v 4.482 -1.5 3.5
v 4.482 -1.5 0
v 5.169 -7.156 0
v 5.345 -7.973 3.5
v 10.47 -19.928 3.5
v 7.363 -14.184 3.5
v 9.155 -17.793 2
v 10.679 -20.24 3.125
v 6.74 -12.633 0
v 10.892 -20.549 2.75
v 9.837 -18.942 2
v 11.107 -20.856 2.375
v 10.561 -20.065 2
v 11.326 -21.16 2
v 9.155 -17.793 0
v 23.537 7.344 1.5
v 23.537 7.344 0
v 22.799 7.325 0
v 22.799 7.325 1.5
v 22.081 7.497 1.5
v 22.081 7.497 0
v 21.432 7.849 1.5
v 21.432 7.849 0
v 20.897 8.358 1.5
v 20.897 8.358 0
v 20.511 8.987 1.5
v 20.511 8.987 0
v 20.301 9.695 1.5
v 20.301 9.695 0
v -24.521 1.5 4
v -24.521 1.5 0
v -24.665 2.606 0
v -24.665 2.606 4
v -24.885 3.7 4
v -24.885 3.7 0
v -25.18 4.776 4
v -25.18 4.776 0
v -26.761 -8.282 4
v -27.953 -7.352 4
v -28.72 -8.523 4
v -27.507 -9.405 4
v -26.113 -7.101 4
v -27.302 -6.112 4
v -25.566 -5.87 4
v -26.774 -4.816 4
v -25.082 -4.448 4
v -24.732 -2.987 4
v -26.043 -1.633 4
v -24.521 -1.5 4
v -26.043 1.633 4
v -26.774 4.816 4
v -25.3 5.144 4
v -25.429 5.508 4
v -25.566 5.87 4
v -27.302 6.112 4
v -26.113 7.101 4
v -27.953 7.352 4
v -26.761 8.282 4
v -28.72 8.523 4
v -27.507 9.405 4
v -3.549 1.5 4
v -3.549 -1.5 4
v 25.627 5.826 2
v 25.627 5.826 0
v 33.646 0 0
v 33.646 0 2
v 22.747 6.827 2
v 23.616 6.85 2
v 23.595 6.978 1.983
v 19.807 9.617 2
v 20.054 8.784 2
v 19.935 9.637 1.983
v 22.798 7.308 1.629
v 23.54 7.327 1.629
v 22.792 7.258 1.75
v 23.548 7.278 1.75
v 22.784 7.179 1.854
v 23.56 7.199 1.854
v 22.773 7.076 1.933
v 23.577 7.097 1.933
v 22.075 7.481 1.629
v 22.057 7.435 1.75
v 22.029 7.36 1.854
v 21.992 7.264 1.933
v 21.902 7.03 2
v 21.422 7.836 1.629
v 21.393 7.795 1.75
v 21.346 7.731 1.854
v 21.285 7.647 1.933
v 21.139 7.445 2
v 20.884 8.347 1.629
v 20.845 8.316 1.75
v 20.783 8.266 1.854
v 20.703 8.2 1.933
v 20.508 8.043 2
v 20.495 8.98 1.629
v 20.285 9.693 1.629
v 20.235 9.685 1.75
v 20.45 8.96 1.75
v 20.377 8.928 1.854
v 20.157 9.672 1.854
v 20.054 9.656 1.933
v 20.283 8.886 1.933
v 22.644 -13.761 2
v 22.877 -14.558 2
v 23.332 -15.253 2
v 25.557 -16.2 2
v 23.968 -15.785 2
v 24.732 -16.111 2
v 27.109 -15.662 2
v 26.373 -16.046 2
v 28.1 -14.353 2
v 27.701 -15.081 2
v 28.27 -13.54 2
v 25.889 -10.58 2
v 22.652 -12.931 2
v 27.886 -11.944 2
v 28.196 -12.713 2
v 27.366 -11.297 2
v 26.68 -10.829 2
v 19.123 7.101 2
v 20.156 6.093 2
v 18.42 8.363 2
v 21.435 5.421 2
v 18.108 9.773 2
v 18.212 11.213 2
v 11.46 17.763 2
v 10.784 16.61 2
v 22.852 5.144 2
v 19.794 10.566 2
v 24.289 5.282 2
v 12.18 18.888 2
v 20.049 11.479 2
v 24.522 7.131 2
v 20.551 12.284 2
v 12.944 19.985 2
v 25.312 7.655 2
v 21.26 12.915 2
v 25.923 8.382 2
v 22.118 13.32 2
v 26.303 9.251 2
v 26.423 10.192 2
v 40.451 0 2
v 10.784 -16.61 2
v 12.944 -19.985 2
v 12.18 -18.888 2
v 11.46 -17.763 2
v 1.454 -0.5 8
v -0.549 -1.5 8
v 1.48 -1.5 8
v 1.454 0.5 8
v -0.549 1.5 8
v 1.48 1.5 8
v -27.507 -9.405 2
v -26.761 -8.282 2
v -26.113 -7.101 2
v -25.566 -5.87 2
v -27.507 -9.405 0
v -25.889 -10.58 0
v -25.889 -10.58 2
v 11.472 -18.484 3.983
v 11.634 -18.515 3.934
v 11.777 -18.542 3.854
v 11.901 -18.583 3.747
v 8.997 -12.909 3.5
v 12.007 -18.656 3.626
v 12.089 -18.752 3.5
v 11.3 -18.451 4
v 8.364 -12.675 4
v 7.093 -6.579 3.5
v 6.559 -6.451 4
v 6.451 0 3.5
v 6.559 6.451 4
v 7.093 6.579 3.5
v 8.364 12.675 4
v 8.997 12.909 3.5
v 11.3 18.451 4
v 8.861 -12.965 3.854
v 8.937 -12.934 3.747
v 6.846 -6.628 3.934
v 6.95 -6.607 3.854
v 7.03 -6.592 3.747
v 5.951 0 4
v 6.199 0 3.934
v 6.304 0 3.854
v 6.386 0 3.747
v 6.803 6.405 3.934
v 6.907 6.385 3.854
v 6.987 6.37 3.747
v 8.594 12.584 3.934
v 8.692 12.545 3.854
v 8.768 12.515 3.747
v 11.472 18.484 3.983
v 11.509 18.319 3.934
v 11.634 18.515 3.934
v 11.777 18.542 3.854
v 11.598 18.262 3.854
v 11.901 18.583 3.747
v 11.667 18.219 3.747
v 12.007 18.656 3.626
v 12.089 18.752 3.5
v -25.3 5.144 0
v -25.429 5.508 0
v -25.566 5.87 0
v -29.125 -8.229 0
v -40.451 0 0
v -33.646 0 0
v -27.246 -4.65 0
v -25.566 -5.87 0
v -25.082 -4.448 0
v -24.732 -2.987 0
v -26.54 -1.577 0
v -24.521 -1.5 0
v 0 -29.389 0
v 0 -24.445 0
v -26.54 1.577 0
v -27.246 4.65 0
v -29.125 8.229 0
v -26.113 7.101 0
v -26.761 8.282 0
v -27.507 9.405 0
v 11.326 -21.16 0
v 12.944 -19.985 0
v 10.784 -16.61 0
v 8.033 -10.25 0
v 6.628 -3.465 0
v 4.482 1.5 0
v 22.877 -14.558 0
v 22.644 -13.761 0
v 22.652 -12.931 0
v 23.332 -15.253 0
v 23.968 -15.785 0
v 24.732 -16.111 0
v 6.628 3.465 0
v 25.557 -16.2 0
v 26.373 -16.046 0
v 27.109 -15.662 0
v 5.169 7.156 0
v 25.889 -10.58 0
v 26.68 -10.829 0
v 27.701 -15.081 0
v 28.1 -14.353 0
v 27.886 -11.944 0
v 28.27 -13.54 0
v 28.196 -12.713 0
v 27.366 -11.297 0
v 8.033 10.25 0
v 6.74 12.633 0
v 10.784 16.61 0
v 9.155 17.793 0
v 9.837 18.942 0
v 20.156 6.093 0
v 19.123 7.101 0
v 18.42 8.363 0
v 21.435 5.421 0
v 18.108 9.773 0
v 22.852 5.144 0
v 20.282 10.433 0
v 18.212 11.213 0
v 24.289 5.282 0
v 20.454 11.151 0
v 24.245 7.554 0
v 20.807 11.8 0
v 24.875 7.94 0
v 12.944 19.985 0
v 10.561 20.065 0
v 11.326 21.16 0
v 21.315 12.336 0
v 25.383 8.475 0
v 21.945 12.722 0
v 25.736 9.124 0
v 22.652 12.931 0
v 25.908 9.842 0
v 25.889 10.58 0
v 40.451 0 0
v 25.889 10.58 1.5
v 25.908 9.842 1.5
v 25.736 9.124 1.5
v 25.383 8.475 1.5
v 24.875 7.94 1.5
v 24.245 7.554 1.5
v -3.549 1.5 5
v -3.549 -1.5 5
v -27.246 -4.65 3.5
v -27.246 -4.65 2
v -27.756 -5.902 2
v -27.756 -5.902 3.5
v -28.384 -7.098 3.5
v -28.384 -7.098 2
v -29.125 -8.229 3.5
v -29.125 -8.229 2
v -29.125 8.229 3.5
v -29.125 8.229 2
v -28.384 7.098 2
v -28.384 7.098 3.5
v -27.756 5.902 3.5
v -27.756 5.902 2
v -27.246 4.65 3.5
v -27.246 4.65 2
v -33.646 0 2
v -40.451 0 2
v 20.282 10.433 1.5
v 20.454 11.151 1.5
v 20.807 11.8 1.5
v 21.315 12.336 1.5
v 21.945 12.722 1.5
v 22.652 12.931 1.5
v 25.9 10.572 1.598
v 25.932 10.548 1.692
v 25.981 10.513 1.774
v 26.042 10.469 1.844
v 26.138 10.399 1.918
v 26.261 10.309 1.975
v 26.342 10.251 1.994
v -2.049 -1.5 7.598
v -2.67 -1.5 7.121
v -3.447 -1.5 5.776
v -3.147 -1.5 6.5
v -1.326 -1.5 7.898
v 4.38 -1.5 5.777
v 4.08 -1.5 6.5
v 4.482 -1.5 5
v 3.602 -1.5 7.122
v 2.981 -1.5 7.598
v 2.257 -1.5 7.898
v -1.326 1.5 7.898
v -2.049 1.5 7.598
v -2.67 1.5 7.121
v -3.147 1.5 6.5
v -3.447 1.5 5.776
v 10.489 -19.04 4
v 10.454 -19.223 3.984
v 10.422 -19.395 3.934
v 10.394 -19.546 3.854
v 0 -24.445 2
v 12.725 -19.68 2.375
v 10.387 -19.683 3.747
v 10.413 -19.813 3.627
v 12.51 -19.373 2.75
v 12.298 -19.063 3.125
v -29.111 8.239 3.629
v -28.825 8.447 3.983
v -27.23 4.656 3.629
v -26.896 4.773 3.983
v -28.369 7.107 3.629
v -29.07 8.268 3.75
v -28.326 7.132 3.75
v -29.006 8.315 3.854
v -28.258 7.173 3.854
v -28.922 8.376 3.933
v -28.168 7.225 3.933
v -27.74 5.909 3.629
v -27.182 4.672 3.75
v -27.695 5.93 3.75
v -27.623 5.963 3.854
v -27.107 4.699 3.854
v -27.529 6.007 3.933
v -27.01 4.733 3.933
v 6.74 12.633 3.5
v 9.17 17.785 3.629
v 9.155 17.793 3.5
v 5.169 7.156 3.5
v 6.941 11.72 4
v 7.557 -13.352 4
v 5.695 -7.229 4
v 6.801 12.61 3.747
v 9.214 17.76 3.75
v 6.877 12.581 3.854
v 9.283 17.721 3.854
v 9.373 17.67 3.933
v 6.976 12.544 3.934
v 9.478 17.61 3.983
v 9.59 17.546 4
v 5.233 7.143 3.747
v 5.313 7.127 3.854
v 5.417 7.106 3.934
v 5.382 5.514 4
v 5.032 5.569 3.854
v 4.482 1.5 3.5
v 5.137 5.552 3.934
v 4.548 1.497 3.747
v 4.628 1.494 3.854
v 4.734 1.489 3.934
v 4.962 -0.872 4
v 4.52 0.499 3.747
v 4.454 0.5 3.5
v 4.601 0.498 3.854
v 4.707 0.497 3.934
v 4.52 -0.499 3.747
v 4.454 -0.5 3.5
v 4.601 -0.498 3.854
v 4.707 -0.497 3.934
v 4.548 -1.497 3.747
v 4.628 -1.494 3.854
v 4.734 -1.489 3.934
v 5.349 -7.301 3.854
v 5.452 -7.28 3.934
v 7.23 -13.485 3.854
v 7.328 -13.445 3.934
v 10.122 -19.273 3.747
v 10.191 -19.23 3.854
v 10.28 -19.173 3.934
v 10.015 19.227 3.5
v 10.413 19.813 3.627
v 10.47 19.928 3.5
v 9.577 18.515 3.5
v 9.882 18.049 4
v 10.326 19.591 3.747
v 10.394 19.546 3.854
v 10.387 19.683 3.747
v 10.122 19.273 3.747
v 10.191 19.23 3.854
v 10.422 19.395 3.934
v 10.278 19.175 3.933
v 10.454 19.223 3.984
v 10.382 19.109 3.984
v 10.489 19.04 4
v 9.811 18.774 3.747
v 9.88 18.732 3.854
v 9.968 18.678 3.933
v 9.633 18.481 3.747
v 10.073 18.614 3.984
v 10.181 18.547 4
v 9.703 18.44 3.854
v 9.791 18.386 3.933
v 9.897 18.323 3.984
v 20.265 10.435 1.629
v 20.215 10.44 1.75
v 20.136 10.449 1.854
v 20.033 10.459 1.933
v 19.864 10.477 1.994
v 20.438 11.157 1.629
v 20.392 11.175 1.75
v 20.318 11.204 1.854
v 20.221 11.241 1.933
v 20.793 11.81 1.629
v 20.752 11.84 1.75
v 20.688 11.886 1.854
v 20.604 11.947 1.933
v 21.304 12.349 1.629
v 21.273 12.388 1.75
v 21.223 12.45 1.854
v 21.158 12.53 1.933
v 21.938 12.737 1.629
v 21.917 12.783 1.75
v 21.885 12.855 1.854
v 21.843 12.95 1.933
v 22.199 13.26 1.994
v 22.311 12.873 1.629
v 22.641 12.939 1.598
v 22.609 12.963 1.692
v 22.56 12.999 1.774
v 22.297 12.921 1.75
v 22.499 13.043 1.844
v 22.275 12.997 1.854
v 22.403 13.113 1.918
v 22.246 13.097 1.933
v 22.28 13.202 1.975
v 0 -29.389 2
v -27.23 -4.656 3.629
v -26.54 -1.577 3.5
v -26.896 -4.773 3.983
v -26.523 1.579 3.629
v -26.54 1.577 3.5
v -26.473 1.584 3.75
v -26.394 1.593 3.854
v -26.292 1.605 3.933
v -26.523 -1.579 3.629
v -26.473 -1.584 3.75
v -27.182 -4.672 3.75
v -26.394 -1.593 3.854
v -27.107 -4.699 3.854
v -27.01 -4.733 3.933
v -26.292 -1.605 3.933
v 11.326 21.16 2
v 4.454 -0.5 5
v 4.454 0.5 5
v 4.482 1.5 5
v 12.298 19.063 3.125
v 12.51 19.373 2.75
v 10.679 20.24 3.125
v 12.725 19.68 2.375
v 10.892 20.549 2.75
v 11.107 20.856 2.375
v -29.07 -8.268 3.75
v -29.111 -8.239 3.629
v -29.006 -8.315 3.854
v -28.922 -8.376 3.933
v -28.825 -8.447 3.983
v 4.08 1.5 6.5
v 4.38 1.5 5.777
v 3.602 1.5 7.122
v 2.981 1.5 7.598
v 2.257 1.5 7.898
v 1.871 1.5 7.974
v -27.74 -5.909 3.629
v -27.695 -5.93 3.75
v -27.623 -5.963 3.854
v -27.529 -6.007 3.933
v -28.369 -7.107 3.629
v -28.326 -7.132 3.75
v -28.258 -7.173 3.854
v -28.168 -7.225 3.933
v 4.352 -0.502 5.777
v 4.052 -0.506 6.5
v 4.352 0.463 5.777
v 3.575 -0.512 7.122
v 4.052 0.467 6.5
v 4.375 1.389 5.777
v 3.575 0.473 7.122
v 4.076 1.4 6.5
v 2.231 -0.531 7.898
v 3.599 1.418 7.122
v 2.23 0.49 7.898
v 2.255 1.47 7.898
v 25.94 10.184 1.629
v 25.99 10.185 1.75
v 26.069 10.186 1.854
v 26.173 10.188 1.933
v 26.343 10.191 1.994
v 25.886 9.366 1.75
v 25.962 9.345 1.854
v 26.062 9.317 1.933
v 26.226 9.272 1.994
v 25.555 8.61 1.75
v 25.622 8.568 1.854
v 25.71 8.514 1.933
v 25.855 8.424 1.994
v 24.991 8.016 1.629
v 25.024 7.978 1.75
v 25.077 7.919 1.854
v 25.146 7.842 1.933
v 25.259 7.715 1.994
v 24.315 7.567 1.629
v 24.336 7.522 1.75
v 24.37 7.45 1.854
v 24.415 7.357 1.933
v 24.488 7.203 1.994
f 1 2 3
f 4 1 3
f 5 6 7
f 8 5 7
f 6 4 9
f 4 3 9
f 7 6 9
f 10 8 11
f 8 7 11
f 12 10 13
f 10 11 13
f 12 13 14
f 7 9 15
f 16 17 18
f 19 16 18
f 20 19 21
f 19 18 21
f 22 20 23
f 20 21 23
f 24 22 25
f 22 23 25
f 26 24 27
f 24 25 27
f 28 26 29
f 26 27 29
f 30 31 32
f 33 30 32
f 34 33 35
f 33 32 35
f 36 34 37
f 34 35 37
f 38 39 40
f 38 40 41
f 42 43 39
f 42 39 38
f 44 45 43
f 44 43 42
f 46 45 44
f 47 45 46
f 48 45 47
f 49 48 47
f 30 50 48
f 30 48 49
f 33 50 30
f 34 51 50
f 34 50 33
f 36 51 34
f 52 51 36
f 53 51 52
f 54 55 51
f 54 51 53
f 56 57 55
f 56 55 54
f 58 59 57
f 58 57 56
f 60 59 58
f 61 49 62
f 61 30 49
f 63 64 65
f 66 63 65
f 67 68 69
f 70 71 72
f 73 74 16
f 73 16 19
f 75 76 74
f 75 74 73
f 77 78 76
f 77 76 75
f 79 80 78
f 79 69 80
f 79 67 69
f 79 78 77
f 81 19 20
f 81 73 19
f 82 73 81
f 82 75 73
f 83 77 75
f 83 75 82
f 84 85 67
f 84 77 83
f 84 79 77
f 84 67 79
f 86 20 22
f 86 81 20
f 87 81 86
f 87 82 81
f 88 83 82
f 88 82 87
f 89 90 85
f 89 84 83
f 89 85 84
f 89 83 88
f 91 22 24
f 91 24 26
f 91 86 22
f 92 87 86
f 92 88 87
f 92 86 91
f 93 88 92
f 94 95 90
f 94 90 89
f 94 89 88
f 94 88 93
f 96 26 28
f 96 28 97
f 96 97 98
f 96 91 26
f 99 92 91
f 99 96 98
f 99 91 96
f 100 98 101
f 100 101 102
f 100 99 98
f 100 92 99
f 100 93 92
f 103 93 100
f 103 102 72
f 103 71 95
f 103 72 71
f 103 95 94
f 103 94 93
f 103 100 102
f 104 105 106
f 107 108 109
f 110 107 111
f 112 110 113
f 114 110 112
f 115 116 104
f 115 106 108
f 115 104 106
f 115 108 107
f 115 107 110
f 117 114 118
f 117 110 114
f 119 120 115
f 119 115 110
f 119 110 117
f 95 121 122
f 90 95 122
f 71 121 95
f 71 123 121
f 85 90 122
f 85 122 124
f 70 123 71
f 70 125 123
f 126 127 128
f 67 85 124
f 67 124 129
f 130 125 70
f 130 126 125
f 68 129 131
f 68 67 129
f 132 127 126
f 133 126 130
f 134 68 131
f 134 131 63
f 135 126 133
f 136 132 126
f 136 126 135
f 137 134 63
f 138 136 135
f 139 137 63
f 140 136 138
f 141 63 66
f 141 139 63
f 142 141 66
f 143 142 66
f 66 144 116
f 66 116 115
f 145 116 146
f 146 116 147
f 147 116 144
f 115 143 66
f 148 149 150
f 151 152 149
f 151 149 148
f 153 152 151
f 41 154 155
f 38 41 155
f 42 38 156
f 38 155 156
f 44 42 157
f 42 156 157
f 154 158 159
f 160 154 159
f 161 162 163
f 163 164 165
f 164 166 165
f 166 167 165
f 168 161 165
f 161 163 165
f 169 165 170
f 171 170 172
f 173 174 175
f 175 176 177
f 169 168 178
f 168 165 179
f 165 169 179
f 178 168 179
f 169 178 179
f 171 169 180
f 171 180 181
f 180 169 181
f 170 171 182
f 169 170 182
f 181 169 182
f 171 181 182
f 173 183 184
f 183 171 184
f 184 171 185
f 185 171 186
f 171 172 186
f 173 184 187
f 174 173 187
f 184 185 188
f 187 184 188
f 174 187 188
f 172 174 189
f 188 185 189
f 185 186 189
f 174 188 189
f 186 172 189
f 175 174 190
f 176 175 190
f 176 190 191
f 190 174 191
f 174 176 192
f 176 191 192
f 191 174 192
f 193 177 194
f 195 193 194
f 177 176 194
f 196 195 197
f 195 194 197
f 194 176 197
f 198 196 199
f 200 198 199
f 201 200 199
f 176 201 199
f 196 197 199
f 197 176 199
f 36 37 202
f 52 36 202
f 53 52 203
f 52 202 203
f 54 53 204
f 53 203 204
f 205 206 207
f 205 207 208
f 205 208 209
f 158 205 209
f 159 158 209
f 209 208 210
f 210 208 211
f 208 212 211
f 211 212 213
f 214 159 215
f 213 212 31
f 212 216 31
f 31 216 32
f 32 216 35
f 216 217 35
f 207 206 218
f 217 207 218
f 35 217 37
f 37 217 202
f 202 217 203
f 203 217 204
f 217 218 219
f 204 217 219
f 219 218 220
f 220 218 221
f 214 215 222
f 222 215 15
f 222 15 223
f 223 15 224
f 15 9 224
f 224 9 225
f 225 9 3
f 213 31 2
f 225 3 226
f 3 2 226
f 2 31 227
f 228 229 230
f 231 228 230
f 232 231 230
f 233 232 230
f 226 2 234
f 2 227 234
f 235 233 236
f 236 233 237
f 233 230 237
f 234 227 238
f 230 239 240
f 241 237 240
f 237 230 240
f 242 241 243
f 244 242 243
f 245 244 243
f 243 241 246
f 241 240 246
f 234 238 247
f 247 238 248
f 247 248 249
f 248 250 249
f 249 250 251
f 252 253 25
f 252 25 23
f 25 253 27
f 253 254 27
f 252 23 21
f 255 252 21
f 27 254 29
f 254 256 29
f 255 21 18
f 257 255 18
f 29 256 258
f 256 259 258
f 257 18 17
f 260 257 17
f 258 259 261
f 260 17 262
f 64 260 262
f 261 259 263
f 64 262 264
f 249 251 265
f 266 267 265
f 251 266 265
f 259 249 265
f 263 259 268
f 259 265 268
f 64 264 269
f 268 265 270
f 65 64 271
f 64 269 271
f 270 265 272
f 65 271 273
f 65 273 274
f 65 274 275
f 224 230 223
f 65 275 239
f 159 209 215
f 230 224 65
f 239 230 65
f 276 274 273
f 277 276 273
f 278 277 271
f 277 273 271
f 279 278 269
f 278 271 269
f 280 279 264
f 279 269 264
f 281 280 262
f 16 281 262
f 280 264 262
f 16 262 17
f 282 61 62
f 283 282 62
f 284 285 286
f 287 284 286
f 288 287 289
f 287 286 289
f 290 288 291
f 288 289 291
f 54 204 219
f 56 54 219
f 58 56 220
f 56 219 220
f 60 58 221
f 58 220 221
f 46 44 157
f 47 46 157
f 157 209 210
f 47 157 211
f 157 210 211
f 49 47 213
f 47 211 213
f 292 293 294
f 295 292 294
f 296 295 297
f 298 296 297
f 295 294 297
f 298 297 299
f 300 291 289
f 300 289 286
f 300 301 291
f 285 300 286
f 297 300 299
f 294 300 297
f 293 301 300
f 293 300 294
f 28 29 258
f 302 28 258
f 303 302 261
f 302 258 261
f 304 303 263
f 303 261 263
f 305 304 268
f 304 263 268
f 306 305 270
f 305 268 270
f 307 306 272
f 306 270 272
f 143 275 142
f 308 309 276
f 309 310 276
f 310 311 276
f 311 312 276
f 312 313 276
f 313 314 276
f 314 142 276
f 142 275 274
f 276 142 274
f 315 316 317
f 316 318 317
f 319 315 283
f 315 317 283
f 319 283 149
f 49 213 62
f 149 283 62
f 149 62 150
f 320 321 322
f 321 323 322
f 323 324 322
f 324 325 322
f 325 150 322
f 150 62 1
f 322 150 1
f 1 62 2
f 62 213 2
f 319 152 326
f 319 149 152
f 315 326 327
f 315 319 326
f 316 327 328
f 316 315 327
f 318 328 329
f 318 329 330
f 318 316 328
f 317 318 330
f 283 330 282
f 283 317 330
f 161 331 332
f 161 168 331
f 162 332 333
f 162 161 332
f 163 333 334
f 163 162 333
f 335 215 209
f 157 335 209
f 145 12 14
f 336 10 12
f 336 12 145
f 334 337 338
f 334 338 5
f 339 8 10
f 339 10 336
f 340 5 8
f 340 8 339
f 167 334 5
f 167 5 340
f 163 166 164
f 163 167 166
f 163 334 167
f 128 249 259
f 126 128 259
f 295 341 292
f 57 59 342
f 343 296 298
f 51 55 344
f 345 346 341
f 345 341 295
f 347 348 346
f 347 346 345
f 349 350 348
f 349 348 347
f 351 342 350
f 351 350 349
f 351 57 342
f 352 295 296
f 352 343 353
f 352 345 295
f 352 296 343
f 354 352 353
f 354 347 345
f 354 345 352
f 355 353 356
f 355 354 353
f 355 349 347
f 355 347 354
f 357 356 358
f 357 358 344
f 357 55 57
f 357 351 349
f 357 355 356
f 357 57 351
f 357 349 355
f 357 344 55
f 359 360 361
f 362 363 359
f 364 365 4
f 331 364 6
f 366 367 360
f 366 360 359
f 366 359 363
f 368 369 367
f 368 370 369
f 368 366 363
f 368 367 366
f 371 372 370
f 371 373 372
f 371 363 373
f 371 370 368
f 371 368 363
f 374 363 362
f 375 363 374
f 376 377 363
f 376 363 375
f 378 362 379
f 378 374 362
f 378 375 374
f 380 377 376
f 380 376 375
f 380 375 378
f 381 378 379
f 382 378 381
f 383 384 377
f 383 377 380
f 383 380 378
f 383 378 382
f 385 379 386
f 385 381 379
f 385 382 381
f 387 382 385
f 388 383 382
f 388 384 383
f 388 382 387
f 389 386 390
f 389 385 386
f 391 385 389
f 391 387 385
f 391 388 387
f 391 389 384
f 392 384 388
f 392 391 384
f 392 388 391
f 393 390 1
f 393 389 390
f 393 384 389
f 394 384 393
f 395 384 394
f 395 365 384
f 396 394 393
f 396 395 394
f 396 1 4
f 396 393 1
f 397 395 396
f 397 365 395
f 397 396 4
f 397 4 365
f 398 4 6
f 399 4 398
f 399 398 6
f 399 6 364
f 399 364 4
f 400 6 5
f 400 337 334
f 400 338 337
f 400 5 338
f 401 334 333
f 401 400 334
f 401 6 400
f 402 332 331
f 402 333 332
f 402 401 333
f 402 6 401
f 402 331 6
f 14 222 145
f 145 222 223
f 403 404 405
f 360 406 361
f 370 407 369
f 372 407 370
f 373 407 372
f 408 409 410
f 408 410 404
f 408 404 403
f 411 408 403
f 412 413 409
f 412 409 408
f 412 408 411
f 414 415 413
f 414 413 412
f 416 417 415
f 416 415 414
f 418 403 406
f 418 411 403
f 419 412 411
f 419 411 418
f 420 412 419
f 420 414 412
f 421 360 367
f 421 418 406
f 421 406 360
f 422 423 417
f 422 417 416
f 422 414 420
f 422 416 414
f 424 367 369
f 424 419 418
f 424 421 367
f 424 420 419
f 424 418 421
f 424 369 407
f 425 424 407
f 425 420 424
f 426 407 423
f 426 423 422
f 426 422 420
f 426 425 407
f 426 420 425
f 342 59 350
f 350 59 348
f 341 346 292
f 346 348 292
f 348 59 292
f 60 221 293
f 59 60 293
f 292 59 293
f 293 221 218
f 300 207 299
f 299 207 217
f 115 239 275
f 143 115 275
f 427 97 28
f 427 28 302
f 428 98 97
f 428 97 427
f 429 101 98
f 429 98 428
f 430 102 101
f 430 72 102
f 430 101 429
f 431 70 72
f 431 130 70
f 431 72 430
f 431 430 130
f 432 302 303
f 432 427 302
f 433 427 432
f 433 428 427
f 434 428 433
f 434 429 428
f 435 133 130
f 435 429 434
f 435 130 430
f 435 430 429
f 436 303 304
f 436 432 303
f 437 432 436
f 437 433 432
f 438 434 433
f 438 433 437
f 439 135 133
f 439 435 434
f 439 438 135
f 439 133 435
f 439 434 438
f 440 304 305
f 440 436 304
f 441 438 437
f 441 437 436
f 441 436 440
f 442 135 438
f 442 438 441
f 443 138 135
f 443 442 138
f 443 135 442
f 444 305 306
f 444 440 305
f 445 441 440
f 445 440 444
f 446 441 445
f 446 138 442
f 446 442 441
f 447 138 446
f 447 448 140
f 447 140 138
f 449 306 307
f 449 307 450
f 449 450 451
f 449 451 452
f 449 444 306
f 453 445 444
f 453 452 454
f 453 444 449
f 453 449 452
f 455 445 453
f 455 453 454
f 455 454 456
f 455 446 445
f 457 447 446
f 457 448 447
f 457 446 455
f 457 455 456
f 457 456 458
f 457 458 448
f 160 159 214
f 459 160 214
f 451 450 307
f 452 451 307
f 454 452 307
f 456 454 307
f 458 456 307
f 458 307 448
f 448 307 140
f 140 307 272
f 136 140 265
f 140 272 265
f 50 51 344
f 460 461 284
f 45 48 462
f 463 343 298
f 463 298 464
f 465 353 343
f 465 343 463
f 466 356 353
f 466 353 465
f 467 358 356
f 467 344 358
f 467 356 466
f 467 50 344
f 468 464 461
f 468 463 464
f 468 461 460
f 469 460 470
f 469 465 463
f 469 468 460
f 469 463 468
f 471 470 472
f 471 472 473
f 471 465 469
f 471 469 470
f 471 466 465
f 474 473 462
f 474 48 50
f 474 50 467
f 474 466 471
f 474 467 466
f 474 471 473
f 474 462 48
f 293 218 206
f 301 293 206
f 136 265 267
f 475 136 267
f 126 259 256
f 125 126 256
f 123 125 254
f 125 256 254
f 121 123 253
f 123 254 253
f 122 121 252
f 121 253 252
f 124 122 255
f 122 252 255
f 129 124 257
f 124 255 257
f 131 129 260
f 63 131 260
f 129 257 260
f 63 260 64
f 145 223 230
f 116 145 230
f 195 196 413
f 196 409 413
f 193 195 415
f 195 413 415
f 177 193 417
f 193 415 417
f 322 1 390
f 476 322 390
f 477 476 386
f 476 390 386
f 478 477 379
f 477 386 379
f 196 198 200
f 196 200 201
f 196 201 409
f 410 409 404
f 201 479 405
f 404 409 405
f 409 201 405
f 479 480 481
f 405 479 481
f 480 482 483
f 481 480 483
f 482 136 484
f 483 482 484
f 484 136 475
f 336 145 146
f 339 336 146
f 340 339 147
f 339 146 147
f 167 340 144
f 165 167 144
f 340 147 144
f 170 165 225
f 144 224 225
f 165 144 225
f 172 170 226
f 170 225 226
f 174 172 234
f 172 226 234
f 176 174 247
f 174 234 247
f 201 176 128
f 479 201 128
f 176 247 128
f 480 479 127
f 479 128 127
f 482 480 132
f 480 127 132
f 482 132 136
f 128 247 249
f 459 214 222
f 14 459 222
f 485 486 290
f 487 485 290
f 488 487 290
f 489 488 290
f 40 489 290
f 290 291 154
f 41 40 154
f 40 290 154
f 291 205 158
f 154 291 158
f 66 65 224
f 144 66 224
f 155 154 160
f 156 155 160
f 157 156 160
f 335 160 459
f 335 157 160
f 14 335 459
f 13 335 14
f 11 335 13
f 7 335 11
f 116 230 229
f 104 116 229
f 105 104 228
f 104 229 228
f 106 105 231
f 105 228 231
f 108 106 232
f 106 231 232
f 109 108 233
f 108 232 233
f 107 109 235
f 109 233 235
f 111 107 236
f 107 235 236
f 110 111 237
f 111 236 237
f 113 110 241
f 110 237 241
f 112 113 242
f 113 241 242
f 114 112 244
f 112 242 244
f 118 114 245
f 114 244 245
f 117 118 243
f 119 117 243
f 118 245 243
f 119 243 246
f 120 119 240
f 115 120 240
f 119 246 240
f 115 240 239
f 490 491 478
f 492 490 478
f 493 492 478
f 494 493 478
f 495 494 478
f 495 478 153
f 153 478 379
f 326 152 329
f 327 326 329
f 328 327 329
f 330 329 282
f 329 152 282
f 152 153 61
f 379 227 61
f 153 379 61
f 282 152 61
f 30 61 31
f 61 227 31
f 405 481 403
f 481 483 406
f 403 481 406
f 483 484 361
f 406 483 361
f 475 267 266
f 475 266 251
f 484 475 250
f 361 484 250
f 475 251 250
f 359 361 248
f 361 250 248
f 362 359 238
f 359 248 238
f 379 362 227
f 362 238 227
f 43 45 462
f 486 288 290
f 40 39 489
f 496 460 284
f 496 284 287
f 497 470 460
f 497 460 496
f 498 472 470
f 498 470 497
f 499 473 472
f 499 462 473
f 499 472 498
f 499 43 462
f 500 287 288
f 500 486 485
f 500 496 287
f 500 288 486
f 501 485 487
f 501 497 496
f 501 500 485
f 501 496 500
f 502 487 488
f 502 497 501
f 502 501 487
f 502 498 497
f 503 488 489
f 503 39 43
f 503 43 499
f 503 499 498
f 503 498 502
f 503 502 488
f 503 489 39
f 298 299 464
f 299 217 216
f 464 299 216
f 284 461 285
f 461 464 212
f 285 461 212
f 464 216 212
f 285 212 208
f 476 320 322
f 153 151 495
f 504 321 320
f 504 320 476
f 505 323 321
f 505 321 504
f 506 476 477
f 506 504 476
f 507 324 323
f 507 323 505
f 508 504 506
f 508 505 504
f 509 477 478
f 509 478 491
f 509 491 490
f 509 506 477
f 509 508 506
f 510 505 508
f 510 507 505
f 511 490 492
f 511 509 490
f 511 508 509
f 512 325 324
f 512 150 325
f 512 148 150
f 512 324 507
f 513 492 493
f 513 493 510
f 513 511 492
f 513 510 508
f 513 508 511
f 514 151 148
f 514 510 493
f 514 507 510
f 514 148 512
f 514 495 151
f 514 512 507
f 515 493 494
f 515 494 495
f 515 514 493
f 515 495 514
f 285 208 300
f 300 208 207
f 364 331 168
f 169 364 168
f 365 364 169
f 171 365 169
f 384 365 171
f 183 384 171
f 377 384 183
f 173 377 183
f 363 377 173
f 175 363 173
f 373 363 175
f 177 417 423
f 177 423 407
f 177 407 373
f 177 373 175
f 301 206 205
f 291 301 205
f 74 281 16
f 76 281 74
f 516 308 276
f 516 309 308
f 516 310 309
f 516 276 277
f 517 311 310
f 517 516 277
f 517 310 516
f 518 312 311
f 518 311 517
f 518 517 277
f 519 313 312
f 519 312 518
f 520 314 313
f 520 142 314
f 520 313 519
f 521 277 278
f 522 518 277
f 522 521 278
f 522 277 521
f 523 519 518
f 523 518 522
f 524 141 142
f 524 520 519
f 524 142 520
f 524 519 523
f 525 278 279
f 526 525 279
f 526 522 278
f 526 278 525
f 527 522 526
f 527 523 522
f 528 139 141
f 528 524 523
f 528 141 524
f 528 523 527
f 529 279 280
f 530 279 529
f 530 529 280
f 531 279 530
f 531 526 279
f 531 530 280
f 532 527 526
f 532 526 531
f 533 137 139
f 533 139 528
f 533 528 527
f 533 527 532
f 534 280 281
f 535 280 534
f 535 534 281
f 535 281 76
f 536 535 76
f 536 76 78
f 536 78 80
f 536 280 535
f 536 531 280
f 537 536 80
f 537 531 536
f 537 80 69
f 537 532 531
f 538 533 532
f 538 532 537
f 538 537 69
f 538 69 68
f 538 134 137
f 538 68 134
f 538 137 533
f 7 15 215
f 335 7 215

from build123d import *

# Parameters (mm, degrees)
F1_DEPTH = 2
F2_R     = 0.5
F3_DEPTH = 4
F4_SIZE  = 2
F5_R     = 0.5
F6_DEPTH = 8
F7_R     = 3


# Not quite as in the source:
# - a feature names something its author has since deleted; it is built from what else it names


with BuildPart() as f1:
    # F0 (on Top) → F1 (new body)
    with BuildSketch(Plane.XY):
        with BuildLine():
            Line((25.88854382, -10.5801345413), (40.4508497187, 0))
            Line((40.4508497187, 0), (25.88854382, 10.5801345413))
            ThreePointArc((25.88854382, 10.5801345413), (25.3831849379, 8.475163306), (23.5374028108, 7.3440665638))
            Line((23.5374028108, 7.3440665638), (25.6267504373, 5.8260666573))
            Line((25.6267504373, 5.8260666573), (33.6456432519, 0))
            Line((33.6456432519, 0), (10.7841511133, -16.6098462924))
            ThreePointArc((10.7841511133, -16.6098462924), (11.814451709, -18.3291218838), (12.94427191, -19.9846985779))
            Line((12.94427191, -19.9846985779), (22.6524758425, -12.9312755504))
            Line((22.6524758425, -12.9312755504), (25.88854382, -10.5801345413))
        make_face()
        with BuildLine():
            ThreePointArc((22.6524758425, -12.9312755504), (27.1085880869, -15.6619846459), (25.88854382, -10.5801345413))
            Line((25.88854382, -10.5801345413), (22.6524758425, -12.9312755504))
        make_face()
        with BuildLine():
            Line((25.6267504373, 5.8260666573), (23.5374028108, 7.3440665638))
            ThreePointArc((23.5374028108, 7.3440665638), (21.4324315756, 7.8494254458), (20.3013348333, 9.6952075729))
            Line((20.3013348333, 9.6952075729), (18.2119872068, 11.2132074794))
            ThreePointArc((18.2119872068, 11.2132074794), (20.1560130652, 6.0925860852), (25.6267504373, 5.8260666573))
        make_face()
        with BuildLine():
            Line((18.2119872068, 11.2132074794), (20.3013348333, 9.6952075729))
            ThreePointArc((20.3013348333, 9.6952075729), (20.8066937154, 11.8001788082), (22.6524758425, 12.9312755504))
            Line((22.6524758425, 12.9312755504), (12.94427191, 19.9846985779))
            ThreePointArc((12.94427191, 19.9846985779), (11.814451709, 18.3291218838), (10.7841511133, 16.6098462924))
            Line((10.7841511133, 16.6098462924), (18.2119872068, 11.2132074794))
        make_face()
    extrude(amount=F1_DEPTH)

    # F2
    f2_edges = [f1.edges().sort_by_distance(p)[0] for p in [
        (21.432432, 7.849425, 2),
    ]]
    fillet(f2_edges, radius=F2_R)



with BuildPart() as f1b:
    # F0 (on Top) → F1, piece 2 (new body)
    with BuildSketch(Plane.XY):
        with BuildLine():
            Line((0, -29.3892626146), (11.3262379212, -21.1602690825))
            ThreePointArc((11.3262379212, -21.1602690825), (10.1939633159, -19.506943), (9.1554367996, -17.7931765073))
            Line((9.1554367996, -17.7931765073), (0, -24.4449907046))
            Line((0, -24.4449907046), (-25.5664713255, -5.8698619956))
            ThreePointArc((-25.5664713255, -5.8698619956), (-26.4247321499, -7.6985729811), (-27.5065778087, -9.4045640367))
            Line((-27.5065778087, -9.4045640367), (-25.88854382, -10.5801345413))
            Line((-25.88854382, -10.5801345413), (-14.5623058987, -18.8091280734))
            Line((-14.5623058987, -18.8091280734), (0, -29.3892626146))
        make_face()
    extrude(amount=F1_DEPTH)


with BuildPart() as f1c:
    # F0 (on Top) → F1, piece 3 (new body)
    with BuildSketch(Plane.XY):
        with BuildLine():
            Line((9.1554367996, -17.7931765073), (10.7841511133, -16.6098462924))
            ThreePointArc((10.7841511133, -16.6098462924), (6.4508497187, 0), (10.7841511133, 16.6098462924))
            Line((10.7841511133, 16.6098462924), (9.1554367996, 17.7931765073))
            ThreePointArc((9.1554367996, 17.7931765073), (5.8461773909, 9.9255555553), (4.4821132939, 1.5))
            ThreePointArc((4.4821132939, 1.5), (4.4508497187, 0), (4.4821132939, -1.5))
            ThreePointArc((4.4821132939, -1.5), (5.8461773909, -9.9255555553), (9.1554367996, -17.7931765073))
        make_face()
    extrude(amount=F1_DEPTH)


with BuildPart() as f1d:
    # F0 (on Top) → F1, piece 4 (new body)
    with BuildSketch(Plane.XY):
        with BuildLine():
            ThreePointArc((-29.1246117975, -8.2289935321), (-28.0552509558, -6.5076210175), (-27.2456067433, -4.6498987043))
            Line((-27.2456067433, -4.6498987043), (-33.6456432519, 0))
            Line((-33.6456432519, 0), (-27.2456067433, 4.6498987043))
            ThreePointArc((-27.2456067433, 4.6498987043), (-28.0552509558, 6.5076210175), (-29.1246117975, 8.2289935321))
            Line((-29.1246117975, 8.2289935321), (-40.4508497187, 0))
            Line((-40.4508497187, 0), (-29.1246117975, -8.2289935321))
        make_face()
    extrude(amount=F1_DEPTH)


with BuildPart() as f1_1:
    add(f1.part)

    add(f1b.part)  # F3 merges F1b

    add(f1c.part)  # F3 merges F1c

    add(f1d.part)  # F3 merges F1d
    # F0 (on Top) → F3 (join)
    with BuildSketch(Plane.XY):
        with BuildLine():
            Line((-27.2456067433, -4.6498987043), (-25.5664713255, -5.8698619956))
            ThreePointArc((-25.5664713255, -5.8698619956), (-24.8897380342, -3.7218010616), (-24.5213173967, -1.5))
            ThreePointArc((-24.5213173967, -1.5), (-24.4508497187, 0), (-24.5213173967, 1.5))
            ThreePointArc((-24.5213173967, 1.5), (-24.7650379905, 3.1552037061), (-25.1802669457, 4.7759084761))
            ThreePointArc((-25.1802669457, 4.7759084761), (-25.3634508604, 5.3263867387), (-25.5664713255, 5.8698619956))
            Line((-25.5664713255, 5.8698619956), (-27.2456067433, 4.6498987043))
            ThreePointArc((-27.2456067433, 4.6498987043), (-26.4508497187, 0), (-27.2456067433, -4.6498987043))
        make_face()
        with BuildLine():
            Line((9.1554367996, -17.7931765073), (10.7841511133, -16.6098462924))
            ThreePointArc((10.7841511133, -16.6098462924), (6.4508497187, 0), (10.7841511133, 16.6098462924))
            Line((10.7841511133, 16.6098462924), (9.1554367996, 17.7931765073))
            ThreePointArc((9.1554367996, 17.7931765073), (5.8461773909, 9.9255555553), (4.4821132939, 1.5))
            ThreePointArc((4.4821132939, 1.5), (4.4508497187, 0), (4.4821132939, -1.5))
            ThreePointArc((4.4821132939, -1.5), (5.8461773909, -9.9255555553), (9.1554367996, -17.7931765073))
        make_face()
        with BuildLine():
            Line((11.3262379212, -21.1602690825), (12.94427191, -19.9846985779))
            ThreePointArc((12.94427191, -19.9846985779), (11.814451709, -18.3291218838), (10.7841511133, -16.6098462924))
            Line((10.7841511133, -16.6098462924), (9.1554367996, -17.7931765073))
            ThreePointArc((9.1554367996, -17.7931765073), (10.1939633159, -19.506943), (11.3262379212, -21.1602690825))
        make_face()
        with BuildLine():
            Line((9.1554367996, 17.7931765073), (10.7841511133, 16.6098462924))
            ThreePointArc((10.7841511133, 16.6098462924), (11.814451709, 18.3291218838), (12.94427191, 19.9846985779))
            Line((12.94427191, 19.9846985779), (11.3262379212, 21.1602690825))
            ThreePointArc((11.3262379212, 21.1602690825), (10.1939633159, 19.506943), (9.1554367996, 17.7931765073))
        make_face()
        with BuildLine():
            Line((-24.5213173967, -1.5), (-3.5491502813, -1.5))
            Line((-3.5491502813, -1.5), (-3.5491502813, 1.5))
            Line((-3.5491502813, 1.5), (-24.5213173967, 1.5))
            ThreePointArc((-24.5213173967, 1.5), (-24.4508497187, 0), (-24.5213173967, -1.5))
        make_face()
        with BuildLine():
            ThreePointArc((-27.5065778087, -9.4045640367), (-26.4247321499, -7.6985729811), (-25.5664713255, -5.8698619956))
            Line((-25.5664713255, -5.8698619956), (-27.2456067433, -4.6498987043))
            ThreePointArc((-27.2456067433, -4.6498987043), (-28.0552509558, -6.5076210175), (-29.1246117975, -8.2289935321))
            Line((-29.1246117975, -8.2289935321), (-27.5065778087, -9.4045640367))
        make_face()
        with BuildLine():
            ThreePointArc((-25.5664713255, 5.8698619956), (-26.4247321499, 7.6985729811), (-27.5065778087, 9.4045640367))
            Line((-27.5065778087, 9.4045640367), (-29.1246117975, 8.2289935321))
            ThreePointArc((-29.1246117975, 8.2289935321), (-28.0552509558, 6.5076210175), (-27.2456067433, 4.6498987043))
            Line((-27.2456067433, 4.6498987043), (-25.5664713255, 5.8698619956))
        make_face()
    extrude(amount=F3_DEPTH)

    # F4
    f4_edges = [f1_1.edges().sort_by_distance(p)[0] for p in [
        (12.135255, 20.572484, 4),
        (12.135255, -20.572484, 4),
    ]]
    chamfer(f4_edges, length=F4_SIZE)

    # F5
    f5_edges = [f1_1.edges().sort_by_distance(p)[0] for p in [
        (-26.45085, 0, 4),
        (11.00599, 18.920807, 4),
        (4.45085, 0, 4),
        (6.45085, 0, 4),
        (11.00599, -18.920807, 4),
    ]]
    fillet(f5_edges, radius=F5_R)

    # F0 (on Top) → F6 (join)
    with BuildSketch(Plane.XY):
        with BuildLine():
            Line((-3.5491502813, -1.5), (4.4821132939, -1.5))
            ThreePointArc((4.4821132939, -1.5), (4.4508497187, 0), (4.4821132939, 1.5))
            Line((4.4821132939, 1.5), (-3.5491502813, 1.5))
            Line((-3.5491502813, 1.5), (-3.5491502813, -1.5))
        make_face()
    extrude(amount=F6_DEPTH)

    # F7
    f7_edges = [f1_1.edges().sort_by_distance(p)[0] for p in [
        (4.45085, 0, 8),
        (-3.54915, 0, 8),
    ]]
    fillet(f7_edges, radius=F7_R)


solid = f1_1.part
